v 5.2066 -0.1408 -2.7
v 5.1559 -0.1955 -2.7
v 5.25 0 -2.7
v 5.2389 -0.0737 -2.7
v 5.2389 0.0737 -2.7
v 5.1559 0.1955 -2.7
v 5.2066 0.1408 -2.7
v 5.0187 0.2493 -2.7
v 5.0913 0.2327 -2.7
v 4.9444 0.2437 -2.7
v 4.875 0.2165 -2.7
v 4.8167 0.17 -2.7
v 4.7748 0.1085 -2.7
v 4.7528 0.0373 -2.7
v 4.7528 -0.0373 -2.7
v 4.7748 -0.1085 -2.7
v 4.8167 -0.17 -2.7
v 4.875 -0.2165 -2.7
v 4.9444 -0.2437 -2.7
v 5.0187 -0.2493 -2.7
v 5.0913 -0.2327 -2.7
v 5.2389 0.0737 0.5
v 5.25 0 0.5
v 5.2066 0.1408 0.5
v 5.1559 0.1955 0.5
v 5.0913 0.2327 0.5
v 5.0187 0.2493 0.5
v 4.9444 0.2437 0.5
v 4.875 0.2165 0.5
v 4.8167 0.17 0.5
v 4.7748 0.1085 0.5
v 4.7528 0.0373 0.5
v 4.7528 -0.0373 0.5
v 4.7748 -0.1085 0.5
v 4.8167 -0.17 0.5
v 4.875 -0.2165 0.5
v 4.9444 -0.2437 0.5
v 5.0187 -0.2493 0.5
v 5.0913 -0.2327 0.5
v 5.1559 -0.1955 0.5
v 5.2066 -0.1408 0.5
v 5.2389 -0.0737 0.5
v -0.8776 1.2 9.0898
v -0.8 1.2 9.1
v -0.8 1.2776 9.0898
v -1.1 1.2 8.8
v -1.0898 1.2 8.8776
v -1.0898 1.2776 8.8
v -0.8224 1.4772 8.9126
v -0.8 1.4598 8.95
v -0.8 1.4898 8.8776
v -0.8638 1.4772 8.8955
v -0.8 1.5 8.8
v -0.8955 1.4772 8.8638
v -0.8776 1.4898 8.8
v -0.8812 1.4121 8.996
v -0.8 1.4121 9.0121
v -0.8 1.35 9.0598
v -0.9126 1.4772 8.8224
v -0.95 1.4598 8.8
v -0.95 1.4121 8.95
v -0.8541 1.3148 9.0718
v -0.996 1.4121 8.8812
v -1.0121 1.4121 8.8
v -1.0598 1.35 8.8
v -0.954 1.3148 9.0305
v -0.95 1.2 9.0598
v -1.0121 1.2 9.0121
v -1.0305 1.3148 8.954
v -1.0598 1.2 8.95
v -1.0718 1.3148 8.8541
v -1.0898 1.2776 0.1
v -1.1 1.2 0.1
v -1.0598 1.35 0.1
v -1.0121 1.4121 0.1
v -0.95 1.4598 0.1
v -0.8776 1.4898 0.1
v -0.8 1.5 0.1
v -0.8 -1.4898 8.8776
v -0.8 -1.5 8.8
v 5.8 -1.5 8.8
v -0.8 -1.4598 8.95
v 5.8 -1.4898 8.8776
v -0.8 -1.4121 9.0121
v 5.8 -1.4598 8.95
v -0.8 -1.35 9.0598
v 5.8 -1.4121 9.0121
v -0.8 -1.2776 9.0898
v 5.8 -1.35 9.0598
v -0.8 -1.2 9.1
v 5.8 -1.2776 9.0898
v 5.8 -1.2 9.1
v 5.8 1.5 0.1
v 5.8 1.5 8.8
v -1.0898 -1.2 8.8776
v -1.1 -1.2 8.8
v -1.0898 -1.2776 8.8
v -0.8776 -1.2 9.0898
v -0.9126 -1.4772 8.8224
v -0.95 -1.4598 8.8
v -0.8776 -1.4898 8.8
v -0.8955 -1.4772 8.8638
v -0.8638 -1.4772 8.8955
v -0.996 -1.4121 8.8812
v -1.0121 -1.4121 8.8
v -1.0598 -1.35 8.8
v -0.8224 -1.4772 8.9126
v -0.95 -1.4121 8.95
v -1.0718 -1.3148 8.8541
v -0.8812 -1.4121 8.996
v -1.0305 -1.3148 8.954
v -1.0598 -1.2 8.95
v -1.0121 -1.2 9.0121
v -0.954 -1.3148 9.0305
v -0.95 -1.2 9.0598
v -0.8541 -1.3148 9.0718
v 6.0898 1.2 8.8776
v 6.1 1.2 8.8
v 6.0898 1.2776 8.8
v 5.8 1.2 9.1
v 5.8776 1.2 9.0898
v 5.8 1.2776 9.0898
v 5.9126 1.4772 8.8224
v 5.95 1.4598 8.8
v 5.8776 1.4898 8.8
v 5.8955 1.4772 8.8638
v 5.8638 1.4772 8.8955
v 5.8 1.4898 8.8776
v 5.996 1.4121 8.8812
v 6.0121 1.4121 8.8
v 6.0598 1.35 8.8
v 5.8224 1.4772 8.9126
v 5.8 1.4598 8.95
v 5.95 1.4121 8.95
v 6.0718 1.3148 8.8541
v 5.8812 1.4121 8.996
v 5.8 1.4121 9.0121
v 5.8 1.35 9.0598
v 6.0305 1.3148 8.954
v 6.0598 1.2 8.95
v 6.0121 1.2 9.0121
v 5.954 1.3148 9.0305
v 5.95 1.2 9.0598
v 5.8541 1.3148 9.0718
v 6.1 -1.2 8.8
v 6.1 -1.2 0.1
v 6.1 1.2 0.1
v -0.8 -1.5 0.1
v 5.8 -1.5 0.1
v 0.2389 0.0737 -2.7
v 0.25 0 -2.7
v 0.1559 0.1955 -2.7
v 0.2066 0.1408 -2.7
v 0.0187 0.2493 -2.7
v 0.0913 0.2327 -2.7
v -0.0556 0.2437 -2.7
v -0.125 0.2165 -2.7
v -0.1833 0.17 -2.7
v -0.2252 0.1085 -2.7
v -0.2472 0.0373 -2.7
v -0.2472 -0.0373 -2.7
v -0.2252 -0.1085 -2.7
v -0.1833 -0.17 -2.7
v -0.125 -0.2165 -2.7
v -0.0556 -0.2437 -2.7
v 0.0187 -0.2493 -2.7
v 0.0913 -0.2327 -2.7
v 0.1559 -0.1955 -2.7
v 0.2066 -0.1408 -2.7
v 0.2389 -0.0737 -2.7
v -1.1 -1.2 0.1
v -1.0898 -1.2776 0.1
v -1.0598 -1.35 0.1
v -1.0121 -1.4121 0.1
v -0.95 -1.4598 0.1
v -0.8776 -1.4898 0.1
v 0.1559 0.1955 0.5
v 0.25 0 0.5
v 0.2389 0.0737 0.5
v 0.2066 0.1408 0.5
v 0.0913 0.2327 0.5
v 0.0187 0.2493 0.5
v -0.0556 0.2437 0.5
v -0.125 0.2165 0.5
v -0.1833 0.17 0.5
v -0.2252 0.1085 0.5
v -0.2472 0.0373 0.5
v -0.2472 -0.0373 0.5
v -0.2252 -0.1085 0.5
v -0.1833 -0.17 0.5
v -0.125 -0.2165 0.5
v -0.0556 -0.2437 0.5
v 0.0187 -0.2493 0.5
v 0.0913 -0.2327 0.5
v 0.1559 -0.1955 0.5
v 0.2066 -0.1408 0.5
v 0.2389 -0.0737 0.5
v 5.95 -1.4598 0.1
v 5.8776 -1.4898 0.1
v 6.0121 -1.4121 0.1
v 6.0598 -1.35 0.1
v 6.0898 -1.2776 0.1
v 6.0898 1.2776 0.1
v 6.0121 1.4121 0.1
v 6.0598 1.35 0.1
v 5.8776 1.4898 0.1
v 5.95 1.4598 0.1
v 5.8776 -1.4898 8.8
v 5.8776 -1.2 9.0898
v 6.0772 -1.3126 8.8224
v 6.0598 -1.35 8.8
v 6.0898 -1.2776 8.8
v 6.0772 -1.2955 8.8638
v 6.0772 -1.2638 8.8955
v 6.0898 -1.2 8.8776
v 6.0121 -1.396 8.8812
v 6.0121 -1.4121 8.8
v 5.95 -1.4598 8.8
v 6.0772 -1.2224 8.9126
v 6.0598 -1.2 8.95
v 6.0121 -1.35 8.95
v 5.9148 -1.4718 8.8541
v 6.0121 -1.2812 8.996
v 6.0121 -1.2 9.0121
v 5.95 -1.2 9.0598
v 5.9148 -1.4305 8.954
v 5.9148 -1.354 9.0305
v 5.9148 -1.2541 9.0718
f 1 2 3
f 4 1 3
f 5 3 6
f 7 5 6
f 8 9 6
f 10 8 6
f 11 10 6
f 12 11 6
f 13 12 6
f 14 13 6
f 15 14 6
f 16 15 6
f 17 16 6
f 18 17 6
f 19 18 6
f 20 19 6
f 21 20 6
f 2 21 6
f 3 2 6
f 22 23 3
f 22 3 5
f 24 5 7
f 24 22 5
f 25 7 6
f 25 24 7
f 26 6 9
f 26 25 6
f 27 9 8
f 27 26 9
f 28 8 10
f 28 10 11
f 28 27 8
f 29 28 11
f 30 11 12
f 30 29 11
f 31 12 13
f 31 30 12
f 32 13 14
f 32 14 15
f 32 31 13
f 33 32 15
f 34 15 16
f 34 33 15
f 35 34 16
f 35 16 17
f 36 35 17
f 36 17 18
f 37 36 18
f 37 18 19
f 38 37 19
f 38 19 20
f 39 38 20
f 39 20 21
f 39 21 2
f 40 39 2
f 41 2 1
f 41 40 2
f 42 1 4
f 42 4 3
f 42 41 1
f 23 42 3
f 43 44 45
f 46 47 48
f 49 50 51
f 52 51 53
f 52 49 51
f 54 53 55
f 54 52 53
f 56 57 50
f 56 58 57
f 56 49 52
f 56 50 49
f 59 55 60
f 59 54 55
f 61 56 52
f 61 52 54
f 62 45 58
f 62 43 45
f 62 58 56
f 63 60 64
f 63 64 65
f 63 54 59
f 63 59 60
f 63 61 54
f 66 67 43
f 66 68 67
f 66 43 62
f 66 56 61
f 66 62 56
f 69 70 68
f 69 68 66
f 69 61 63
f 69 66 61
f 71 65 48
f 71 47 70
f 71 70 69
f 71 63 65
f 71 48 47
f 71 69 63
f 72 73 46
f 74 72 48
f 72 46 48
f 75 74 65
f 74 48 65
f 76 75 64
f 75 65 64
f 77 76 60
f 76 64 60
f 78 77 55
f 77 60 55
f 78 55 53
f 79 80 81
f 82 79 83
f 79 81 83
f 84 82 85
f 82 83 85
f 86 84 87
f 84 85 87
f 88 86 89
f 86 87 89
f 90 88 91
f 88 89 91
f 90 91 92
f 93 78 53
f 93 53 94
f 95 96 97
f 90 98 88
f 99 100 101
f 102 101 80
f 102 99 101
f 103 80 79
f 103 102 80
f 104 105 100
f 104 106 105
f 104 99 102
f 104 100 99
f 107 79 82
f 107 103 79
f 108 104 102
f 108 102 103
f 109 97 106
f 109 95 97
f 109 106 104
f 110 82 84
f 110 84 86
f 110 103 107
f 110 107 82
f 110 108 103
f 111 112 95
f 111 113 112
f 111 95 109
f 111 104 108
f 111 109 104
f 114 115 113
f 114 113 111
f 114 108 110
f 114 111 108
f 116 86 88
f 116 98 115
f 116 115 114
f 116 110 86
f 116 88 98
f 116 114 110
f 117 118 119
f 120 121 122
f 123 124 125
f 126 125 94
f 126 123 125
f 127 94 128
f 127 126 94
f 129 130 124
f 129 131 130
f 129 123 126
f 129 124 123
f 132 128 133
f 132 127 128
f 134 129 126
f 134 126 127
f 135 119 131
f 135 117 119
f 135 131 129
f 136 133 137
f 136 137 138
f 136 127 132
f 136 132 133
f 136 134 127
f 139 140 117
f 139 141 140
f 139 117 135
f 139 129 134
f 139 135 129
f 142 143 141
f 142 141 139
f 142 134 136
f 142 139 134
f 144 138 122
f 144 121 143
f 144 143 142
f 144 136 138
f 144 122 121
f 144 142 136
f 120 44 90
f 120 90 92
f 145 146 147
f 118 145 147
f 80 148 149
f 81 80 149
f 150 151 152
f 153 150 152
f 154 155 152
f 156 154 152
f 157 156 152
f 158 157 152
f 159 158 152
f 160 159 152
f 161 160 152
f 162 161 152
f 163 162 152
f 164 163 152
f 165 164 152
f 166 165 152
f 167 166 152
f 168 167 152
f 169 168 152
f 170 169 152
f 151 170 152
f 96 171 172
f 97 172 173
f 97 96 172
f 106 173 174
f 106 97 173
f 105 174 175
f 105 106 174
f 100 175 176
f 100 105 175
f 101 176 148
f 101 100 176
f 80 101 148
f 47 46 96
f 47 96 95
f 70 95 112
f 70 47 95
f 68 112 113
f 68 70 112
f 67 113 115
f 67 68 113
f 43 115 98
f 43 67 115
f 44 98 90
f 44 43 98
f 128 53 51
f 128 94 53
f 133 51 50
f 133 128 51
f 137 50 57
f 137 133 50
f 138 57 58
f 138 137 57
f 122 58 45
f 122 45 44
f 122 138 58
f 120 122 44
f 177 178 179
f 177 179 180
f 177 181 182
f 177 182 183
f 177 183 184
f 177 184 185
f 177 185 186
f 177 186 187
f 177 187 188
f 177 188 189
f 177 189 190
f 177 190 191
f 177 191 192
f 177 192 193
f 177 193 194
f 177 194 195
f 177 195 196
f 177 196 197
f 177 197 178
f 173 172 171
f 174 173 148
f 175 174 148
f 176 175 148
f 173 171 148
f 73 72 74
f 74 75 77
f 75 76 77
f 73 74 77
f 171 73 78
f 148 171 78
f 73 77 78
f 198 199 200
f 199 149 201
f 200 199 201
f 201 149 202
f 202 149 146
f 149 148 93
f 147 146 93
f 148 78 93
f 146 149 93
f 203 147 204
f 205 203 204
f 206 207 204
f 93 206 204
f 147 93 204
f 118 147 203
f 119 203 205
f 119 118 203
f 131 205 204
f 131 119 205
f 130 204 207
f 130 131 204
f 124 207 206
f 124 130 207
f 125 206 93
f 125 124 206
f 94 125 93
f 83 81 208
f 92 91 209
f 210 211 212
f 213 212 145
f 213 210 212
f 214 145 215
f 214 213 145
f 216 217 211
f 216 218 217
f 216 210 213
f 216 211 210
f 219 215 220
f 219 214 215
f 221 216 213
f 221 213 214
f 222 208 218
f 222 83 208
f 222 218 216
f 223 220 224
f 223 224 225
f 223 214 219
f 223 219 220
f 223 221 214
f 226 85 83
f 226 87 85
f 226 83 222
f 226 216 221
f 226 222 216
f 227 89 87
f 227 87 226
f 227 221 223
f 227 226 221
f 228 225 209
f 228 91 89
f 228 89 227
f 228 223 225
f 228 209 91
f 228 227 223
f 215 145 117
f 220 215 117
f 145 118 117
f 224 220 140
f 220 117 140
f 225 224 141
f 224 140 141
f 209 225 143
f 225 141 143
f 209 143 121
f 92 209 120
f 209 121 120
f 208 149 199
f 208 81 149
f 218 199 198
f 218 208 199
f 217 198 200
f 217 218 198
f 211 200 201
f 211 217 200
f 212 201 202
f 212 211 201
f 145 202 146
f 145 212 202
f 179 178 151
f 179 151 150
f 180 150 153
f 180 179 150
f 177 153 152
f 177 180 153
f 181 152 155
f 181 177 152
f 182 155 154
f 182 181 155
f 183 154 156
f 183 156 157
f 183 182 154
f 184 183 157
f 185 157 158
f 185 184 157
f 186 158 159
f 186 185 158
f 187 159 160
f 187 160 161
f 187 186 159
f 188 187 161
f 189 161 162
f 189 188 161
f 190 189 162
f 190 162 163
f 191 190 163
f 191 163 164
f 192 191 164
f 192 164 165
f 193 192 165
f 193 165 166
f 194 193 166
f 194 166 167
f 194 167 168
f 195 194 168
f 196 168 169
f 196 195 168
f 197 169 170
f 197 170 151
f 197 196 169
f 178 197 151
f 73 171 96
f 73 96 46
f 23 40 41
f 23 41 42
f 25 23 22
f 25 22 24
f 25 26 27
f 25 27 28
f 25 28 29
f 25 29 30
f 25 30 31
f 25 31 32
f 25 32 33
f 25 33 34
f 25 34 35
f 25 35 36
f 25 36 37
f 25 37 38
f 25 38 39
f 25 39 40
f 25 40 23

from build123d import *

# Parameters (mm, degrees)
SKETCH_W     = 7.2
SKETCH_H     = 3
PAD_DEPTH    = 9
FILLET_R     = 0.3
SKETCH001_R  = 0.25
PAD001_DEPTH = 3.2


with BuildPart() as fillet_body:
    # Sketch → Pad (new body)
    with BuildSketch(Plane.XY.offset(0.1)):
        with Locations((2.5, 0)):
            Rectangle(SKETCH_W, SKETCH_H)
    extrude(amount=PAD_DEPTH)

    # Fillet
    fillet_edges = [fillet_body.edges().sort_by_distance(p)[0] for p in [
        (-1.1, 0, 9.1),
        (-1.1, -1.5, 4.6),
        (2.5, -1.5, 9.1),
        (6.1, -1.5, 4.6),
        (6.1, 0, 9.1),
        (6.1, 1.5, 4.6),
        (2.5, 1.5, 9.1),
        (-1.1, 1.5, 4.6),
    ]]
    fillet(fillet_edges, radius=FILLET_R)


with BuildPart() as pad001:
    # Sketch001 → Pad001 (new body)
    with BuildSketch(Plane.XY.offset(0.5)):
        Circle(SKETCH001_R)
        with Locations((5, 0)):
            Circle(SKETCH001_R)
    extrude(amount=-PAD001_DEPTH)


solid = Compound([fillet_body.part, pad001.part])
